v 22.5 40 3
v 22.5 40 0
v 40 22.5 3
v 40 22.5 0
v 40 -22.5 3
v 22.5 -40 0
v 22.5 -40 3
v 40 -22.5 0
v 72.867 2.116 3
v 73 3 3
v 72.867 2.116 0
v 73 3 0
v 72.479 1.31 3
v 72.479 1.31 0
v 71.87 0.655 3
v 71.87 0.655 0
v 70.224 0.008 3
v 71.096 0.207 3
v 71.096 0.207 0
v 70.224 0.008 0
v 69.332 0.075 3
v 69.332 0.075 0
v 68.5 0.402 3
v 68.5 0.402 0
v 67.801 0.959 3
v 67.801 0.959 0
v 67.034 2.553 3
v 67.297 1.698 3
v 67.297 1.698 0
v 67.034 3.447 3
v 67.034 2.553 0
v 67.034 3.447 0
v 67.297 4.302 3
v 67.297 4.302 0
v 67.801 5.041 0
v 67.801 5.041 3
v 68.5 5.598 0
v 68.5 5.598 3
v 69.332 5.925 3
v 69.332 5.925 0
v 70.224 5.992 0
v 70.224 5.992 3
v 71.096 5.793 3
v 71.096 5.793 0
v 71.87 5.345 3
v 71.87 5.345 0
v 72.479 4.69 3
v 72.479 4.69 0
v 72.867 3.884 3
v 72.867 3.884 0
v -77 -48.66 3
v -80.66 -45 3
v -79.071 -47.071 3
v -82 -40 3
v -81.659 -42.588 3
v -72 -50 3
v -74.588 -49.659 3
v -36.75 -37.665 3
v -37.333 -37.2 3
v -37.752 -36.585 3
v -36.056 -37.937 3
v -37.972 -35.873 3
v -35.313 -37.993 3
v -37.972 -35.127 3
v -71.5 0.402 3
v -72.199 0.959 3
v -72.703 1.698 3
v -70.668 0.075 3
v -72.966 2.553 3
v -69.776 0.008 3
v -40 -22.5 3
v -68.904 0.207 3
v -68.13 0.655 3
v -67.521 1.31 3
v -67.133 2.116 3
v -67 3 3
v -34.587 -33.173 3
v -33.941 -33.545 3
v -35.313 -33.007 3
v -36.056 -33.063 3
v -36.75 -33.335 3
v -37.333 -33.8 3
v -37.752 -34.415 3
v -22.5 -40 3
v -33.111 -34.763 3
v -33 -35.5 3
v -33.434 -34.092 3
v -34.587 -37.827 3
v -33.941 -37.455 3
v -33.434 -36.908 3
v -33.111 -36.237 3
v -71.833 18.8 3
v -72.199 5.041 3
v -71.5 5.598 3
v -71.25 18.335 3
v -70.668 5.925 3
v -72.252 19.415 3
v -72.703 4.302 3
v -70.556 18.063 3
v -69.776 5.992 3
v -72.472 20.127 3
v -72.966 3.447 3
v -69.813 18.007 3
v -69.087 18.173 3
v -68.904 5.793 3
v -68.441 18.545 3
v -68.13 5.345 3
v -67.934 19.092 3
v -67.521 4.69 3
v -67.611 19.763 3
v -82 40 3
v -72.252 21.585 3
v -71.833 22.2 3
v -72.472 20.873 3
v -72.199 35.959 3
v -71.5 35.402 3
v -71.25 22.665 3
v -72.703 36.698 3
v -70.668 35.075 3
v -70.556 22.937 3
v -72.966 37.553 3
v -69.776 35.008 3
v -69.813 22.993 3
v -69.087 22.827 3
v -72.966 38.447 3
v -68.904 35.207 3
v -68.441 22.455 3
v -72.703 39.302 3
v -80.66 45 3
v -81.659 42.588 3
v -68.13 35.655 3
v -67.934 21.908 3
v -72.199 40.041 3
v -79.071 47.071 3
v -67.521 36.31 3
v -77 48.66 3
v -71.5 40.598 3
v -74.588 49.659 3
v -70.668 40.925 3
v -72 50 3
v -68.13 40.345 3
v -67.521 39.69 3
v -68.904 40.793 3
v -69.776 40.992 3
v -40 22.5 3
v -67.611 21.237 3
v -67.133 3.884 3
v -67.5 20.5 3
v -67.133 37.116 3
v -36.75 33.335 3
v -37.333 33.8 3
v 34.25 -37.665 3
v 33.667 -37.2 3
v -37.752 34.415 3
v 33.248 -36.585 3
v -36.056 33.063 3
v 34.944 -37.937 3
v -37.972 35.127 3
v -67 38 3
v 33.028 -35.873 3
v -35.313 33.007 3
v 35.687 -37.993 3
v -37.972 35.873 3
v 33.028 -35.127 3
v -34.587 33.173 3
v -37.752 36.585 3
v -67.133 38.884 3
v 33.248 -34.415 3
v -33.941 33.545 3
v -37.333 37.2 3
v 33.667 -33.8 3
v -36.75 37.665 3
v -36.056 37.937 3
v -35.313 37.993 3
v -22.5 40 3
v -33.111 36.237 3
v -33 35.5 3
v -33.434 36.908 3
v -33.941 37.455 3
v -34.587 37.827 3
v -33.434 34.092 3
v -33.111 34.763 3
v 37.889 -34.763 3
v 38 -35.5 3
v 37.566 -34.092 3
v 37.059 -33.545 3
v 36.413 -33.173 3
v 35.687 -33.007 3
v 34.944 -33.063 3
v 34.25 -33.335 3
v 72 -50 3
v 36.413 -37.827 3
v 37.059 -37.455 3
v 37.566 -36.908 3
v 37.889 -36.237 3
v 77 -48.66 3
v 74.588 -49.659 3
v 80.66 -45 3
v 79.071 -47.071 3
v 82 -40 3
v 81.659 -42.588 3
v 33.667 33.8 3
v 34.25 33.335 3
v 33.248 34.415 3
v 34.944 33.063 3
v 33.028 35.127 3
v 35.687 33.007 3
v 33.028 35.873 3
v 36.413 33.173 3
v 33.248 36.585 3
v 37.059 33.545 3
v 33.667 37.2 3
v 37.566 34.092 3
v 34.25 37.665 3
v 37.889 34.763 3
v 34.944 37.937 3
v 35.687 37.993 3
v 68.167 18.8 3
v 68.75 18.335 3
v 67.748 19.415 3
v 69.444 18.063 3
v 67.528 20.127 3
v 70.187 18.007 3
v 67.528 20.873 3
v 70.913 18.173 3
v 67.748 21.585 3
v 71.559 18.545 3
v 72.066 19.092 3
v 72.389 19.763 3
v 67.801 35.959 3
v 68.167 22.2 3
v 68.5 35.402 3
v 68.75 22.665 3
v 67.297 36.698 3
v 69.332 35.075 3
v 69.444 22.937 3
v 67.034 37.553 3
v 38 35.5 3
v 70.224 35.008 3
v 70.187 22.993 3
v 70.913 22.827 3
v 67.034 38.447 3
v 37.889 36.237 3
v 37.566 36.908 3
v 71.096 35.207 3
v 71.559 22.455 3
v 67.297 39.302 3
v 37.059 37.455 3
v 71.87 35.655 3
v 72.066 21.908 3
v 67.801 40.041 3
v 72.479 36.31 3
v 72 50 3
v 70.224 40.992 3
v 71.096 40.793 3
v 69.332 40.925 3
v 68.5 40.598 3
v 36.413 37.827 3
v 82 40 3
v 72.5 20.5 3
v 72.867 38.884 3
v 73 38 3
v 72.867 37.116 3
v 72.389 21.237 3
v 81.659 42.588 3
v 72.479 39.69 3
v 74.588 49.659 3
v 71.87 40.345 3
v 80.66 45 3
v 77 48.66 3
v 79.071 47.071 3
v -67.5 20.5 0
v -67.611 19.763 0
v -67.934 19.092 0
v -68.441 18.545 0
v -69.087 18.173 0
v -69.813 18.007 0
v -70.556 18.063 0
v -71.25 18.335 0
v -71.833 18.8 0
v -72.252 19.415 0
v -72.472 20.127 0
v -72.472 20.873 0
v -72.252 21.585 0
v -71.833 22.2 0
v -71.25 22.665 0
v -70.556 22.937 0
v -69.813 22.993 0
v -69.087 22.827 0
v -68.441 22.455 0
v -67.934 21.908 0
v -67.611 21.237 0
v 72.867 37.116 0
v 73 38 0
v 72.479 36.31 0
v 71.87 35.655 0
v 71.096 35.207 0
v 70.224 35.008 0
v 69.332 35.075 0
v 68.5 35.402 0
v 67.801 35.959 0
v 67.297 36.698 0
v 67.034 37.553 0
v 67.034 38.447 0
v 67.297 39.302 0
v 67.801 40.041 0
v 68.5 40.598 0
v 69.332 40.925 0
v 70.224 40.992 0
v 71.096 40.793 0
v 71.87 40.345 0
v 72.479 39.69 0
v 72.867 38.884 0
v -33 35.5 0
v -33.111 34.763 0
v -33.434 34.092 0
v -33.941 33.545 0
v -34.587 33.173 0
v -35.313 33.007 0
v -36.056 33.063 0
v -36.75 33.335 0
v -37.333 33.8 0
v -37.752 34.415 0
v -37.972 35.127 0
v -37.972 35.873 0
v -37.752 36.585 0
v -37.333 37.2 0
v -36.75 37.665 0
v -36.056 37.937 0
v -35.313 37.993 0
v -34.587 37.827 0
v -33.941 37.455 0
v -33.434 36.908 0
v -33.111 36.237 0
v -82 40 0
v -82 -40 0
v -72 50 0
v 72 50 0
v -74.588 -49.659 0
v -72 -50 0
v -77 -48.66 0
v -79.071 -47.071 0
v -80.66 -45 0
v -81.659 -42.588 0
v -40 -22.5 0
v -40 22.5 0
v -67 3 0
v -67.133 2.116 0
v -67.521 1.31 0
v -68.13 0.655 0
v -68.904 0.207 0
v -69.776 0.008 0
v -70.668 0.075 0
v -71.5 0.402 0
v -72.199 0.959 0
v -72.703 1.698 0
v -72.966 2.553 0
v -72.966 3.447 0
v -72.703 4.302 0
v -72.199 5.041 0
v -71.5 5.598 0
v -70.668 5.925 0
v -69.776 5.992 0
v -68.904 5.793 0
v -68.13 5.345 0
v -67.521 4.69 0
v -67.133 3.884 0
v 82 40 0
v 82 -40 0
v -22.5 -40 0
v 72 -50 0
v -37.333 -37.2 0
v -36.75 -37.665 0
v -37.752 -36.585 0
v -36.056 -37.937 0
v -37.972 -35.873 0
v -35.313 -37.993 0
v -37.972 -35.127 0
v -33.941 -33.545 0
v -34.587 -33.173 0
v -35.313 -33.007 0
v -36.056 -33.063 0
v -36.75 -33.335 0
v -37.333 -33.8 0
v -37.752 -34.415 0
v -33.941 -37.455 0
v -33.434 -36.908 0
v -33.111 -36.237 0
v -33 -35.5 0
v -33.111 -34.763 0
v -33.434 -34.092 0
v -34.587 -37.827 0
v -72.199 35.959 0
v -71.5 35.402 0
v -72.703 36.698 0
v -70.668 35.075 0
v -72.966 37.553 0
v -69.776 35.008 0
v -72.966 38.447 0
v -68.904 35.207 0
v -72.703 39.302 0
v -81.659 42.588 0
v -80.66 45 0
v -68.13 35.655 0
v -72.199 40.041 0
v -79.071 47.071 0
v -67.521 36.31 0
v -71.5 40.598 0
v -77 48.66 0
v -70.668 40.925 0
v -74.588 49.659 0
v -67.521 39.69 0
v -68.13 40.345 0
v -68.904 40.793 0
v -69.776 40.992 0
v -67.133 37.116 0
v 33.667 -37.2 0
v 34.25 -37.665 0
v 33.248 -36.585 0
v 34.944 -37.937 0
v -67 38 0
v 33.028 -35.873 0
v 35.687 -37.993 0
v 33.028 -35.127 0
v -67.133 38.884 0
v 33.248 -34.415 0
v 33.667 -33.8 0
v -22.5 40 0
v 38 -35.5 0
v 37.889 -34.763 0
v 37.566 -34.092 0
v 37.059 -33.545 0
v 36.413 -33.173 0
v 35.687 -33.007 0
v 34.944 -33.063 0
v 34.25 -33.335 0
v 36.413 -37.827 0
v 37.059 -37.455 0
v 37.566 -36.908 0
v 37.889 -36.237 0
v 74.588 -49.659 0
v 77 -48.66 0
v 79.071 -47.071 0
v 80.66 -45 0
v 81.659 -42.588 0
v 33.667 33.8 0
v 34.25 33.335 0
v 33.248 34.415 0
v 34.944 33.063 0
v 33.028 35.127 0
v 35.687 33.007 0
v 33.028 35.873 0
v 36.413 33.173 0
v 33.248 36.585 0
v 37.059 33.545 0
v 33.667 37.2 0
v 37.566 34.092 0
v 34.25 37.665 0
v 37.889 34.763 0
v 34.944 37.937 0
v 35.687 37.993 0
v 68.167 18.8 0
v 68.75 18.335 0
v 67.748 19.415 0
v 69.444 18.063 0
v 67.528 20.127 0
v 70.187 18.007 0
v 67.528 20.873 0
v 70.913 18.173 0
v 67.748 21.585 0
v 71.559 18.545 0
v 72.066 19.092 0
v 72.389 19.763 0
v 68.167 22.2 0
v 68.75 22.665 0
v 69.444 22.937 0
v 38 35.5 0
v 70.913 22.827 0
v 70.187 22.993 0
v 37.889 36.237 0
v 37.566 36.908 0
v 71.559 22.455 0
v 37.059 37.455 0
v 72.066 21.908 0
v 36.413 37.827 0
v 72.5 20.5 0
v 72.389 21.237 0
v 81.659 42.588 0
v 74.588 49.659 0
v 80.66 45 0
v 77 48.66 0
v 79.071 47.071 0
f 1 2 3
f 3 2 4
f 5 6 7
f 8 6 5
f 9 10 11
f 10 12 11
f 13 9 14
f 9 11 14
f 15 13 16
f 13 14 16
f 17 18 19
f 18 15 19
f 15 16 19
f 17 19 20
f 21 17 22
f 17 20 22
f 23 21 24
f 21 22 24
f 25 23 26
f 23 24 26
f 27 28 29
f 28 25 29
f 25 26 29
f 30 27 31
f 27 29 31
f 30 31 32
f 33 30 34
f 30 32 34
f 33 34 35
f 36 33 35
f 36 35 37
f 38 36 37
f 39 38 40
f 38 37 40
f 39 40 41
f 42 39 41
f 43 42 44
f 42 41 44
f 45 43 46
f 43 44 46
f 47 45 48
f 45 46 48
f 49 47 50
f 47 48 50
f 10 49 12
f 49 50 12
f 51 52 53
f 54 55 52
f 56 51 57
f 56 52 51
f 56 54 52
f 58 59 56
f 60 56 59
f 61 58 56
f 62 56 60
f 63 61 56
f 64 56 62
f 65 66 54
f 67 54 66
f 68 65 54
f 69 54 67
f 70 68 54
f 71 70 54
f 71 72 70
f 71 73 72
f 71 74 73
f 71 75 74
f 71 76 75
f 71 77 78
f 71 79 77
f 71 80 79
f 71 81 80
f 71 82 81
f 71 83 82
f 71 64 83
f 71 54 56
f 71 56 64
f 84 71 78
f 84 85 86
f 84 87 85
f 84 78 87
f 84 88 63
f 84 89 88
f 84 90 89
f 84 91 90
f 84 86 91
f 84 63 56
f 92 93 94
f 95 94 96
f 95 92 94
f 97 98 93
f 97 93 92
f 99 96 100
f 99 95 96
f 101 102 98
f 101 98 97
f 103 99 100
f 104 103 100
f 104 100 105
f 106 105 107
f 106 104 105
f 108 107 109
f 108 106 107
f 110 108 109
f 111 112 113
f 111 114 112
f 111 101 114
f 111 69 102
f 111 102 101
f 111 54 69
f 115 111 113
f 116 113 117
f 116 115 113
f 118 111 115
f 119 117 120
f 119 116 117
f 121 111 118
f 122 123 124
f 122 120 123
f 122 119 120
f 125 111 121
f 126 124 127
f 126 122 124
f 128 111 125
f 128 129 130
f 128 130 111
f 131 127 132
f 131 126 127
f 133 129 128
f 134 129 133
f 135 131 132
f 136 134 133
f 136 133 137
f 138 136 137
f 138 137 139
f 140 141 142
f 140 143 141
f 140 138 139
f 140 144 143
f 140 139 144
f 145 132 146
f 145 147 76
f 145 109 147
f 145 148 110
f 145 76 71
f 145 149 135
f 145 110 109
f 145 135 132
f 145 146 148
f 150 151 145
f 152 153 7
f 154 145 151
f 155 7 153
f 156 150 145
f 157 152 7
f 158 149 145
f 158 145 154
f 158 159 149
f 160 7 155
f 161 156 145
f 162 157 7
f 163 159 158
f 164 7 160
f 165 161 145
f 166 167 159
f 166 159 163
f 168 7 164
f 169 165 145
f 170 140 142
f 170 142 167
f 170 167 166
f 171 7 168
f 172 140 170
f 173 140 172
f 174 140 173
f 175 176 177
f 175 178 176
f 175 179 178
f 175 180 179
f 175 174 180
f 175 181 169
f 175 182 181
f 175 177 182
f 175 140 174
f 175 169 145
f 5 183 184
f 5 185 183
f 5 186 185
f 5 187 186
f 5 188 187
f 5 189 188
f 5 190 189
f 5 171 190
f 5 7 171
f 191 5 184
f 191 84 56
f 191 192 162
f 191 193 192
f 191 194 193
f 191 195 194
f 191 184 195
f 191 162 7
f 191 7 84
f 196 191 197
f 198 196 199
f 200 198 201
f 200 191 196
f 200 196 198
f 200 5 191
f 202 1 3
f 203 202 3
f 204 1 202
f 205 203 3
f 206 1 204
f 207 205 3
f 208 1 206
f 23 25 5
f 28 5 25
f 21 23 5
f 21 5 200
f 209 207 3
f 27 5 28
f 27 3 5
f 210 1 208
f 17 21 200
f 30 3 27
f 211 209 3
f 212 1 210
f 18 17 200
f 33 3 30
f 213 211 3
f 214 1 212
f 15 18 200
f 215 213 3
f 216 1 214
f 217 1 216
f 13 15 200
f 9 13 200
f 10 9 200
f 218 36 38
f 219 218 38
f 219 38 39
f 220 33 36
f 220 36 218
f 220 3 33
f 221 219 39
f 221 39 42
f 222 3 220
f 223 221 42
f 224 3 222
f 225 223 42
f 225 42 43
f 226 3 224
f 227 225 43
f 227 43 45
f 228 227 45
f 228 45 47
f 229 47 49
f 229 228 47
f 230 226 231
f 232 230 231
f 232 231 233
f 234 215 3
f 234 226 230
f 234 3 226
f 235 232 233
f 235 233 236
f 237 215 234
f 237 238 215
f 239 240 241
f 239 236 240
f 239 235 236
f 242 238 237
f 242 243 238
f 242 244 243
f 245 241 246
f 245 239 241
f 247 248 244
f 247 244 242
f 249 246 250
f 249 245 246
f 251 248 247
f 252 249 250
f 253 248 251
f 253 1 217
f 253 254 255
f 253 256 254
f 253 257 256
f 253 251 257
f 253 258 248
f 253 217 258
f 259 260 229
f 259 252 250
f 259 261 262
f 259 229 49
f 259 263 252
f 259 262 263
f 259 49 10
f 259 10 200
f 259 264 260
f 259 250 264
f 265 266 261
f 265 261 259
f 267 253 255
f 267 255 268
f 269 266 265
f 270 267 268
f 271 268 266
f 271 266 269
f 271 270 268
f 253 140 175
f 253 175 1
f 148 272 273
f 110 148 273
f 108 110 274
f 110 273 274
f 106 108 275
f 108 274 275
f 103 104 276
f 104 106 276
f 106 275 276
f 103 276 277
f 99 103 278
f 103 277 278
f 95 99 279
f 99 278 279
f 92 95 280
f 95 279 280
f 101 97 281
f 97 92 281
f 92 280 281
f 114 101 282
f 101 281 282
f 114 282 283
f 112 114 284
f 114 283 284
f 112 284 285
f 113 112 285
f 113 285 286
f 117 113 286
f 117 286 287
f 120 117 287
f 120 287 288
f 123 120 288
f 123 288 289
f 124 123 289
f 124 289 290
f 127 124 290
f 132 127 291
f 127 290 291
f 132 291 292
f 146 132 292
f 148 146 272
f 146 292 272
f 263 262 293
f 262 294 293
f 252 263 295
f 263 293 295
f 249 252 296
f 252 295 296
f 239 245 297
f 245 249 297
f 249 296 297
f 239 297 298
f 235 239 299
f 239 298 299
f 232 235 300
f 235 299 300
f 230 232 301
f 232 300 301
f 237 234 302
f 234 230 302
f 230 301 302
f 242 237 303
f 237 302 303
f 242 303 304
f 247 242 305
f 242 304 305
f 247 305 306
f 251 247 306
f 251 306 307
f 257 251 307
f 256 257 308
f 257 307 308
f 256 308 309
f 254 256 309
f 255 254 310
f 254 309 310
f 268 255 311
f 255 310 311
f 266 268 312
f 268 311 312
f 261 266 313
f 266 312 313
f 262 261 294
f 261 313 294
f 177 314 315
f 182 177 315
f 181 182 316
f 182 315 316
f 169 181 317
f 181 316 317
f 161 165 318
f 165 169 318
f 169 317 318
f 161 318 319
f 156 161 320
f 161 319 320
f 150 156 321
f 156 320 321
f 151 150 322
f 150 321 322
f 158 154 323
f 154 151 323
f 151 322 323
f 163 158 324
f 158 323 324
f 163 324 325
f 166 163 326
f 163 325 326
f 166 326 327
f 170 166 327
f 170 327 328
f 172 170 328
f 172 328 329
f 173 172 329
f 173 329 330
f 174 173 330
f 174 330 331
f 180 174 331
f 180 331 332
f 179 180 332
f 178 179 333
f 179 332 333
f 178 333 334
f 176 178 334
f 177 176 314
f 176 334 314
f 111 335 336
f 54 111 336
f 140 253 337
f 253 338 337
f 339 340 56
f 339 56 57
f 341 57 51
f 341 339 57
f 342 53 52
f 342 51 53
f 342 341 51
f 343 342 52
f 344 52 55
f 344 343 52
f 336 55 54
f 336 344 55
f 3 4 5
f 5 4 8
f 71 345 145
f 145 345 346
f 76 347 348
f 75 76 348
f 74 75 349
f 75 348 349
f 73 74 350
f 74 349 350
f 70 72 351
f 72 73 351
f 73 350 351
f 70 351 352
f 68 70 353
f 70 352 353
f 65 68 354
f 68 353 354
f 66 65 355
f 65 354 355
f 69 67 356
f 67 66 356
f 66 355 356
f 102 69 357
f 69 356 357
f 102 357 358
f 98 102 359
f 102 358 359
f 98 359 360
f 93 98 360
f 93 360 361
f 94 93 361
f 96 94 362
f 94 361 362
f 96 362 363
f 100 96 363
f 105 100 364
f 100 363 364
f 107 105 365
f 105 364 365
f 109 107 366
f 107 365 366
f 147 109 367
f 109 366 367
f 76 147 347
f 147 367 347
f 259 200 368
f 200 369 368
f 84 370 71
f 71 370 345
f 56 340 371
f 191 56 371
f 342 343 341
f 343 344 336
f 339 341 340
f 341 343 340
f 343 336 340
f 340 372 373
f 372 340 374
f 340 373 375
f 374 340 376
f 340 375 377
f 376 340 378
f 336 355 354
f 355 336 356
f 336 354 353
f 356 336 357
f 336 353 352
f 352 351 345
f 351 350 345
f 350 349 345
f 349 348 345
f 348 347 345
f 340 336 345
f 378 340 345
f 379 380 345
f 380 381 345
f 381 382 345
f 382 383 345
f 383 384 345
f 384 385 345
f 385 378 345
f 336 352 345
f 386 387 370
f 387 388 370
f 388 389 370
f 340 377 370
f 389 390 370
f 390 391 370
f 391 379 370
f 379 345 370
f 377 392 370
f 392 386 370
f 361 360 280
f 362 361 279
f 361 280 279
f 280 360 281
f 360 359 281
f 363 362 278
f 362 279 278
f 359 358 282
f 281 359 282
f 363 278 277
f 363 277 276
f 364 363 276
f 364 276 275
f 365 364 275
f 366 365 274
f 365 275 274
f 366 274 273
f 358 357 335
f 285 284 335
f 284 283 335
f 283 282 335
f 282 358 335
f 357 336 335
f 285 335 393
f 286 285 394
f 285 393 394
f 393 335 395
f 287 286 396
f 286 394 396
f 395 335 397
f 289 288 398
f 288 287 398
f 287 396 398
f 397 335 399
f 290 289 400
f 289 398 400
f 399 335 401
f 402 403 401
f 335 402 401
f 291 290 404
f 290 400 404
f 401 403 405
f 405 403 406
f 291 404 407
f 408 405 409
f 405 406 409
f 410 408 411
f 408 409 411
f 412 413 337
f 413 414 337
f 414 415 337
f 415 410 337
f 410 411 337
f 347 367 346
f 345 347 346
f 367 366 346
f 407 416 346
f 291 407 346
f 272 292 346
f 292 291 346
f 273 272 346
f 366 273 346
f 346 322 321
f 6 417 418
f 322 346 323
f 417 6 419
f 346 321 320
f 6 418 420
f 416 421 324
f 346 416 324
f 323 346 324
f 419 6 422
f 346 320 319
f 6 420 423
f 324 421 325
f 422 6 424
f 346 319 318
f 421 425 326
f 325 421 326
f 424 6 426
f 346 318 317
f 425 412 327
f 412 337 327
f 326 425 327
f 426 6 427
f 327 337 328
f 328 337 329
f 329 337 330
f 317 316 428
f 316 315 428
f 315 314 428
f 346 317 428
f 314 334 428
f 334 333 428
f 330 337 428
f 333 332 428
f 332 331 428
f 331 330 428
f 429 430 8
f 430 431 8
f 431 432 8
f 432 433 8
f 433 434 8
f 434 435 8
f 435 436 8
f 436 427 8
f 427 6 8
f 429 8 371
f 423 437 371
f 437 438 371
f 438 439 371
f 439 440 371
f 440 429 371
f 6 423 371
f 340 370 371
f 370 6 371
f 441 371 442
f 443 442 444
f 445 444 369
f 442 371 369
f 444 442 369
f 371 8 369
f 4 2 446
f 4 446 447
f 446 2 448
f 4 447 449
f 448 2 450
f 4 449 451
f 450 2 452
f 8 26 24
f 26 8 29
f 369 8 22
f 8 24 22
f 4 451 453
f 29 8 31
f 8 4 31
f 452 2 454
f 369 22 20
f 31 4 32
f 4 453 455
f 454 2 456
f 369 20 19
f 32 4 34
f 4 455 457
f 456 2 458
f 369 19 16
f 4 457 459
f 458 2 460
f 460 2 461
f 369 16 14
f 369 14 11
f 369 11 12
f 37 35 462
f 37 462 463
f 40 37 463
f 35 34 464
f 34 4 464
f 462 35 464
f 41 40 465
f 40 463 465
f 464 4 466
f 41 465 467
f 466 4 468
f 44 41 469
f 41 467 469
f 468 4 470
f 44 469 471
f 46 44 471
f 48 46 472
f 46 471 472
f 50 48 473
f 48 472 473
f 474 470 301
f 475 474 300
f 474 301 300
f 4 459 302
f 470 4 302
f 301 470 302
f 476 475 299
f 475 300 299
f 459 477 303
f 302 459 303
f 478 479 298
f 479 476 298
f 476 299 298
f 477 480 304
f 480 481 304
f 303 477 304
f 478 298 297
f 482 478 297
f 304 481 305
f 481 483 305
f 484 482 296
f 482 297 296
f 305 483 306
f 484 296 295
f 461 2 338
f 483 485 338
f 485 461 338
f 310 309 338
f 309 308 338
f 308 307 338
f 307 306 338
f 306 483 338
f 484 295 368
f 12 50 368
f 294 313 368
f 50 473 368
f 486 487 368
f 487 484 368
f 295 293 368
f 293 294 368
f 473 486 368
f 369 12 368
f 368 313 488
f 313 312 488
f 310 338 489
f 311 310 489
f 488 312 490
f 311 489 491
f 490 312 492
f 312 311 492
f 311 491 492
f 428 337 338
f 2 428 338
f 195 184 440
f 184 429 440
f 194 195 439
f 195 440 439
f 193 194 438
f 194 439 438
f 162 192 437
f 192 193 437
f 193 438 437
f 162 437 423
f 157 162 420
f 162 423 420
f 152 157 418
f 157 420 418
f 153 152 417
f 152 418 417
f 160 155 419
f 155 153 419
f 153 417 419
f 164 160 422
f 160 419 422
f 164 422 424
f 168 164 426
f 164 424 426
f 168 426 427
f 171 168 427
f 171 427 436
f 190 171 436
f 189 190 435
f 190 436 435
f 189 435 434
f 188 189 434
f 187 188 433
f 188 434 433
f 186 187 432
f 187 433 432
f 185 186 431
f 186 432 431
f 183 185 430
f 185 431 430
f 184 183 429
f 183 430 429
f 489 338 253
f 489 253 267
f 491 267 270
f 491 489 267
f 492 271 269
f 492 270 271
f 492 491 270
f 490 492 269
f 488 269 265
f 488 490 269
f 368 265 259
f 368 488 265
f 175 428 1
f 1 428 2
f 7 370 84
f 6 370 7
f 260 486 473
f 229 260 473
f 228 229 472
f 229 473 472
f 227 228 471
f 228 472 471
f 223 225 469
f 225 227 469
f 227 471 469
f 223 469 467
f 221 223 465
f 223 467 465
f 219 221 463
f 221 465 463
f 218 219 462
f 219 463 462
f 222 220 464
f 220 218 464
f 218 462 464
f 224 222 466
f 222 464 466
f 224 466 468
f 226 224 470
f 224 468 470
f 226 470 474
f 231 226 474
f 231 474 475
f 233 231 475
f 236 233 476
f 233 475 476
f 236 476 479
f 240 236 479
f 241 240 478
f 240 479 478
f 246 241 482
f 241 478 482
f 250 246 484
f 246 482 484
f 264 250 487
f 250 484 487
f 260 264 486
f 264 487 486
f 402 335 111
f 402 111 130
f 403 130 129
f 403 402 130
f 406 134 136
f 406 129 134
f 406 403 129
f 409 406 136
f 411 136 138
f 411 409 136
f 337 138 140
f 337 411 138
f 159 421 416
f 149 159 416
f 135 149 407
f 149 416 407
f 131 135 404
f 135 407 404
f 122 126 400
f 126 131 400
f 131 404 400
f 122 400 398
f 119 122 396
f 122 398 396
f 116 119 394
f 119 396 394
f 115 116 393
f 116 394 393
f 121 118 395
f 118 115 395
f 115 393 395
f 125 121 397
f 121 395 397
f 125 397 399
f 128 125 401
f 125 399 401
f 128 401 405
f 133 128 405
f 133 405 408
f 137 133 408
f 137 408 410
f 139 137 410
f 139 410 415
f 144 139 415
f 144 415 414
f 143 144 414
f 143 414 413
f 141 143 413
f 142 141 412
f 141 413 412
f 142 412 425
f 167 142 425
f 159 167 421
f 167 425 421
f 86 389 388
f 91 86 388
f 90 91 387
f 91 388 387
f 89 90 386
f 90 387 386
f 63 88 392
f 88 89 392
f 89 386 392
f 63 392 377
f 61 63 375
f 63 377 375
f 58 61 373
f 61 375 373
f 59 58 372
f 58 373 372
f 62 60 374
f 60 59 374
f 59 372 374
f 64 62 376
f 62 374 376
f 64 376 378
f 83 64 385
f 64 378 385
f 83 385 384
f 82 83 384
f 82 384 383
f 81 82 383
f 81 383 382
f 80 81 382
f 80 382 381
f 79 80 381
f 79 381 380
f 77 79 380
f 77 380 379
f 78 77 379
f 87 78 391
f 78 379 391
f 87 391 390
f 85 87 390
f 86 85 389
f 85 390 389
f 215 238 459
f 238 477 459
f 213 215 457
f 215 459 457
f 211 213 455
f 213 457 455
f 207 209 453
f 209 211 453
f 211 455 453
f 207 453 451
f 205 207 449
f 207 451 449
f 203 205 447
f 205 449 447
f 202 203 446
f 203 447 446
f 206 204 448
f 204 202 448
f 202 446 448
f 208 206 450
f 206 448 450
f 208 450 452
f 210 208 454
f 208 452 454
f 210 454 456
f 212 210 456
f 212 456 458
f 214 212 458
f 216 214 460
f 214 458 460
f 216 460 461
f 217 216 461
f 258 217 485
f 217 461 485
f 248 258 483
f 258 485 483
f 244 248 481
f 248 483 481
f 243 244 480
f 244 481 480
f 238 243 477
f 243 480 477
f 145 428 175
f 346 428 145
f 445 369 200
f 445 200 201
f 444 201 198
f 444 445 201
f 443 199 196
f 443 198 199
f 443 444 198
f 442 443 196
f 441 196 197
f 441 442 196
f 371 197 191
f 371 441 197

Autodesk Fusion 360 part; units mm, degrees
sketch "Sketch1" plane through (0, 0, 0) normal (0, 0, 1) x (1, 0, 0)
  line L0 (35.5, 35.5) -> (-35.5, 35.5) construction
  line L1 (-35.5, 35.5) -> (-35.5, -35.5) construction
  line L2 (-35.5, -35.5) -> (35.5, -35.5) construction
  line L3 (35.5, -35.5) -> (35.5, 35.5) construction
  line L4 (35.5, 35.5) -> (-35.5, -35.5) construction
  line L5 (-35.5, 35.5) -> (35.5, -35.5) construction
  circle A0 centre (-35.5, 35.5) radius 2.5
  circle A1 centre (35.5, 35.5) radius 2.5
  circle A2 centre (-35.5, -35.5) radius 2.5
  circle A3 centre (35.5, -35.5) radius 2.5
  line L6 (63, 50) -> (-63, 50) construction
  line L7 (-63, 50) -> (-63, -50) construction
  line L8 (-63, -50) -> (63, -50) construction
  line L9 (63, -50) -> (63, 50) construction
  line L10 (63, 50) -> (-63, -50) construction
  line L11 (-63, 50) -> (63, -50) construction
  line L12 (40, 40) -> (-40, 40) construction
  line L13 (-40, 40) -> (-40, -40) construction
  line L14 (-40, -40) -> (40, -40) construction
  line L15 (40, -40) -> (40, 40) construction
  line L16 (40, 40) -> (-40, -40) construction
  line L17 (-40, 40) -> (40, -40) construction
  line L18 (-22.5, 40) -> (-40, 22.5)
  line L19 (0, 0) -> (0, 35.5) construction
  line L20 (0, 0) -> (35.5, 0) construction
  line L21 (22.5, 40) -> (40, 22.5)
  line L22 (-22.5, -40) -> (-40, -22.5)
  line L23 (22.5, -40) -> (40, -22.5)
  line L24 (-40, -22.5) -> (-40, 22.5)
  line L25 (-22.5, 40) -> (22.5, 40)
  line L26 (40, 22.5) -> (40, -22.5)
  line L27 (-22.5, -40) -> (22.5, -40)
  circle A4 centre (-70, 3) radius 3
  circle A5 centre (-70, 38) radius 3
  circle A6 centre (70, 38) radius 3
  circle A7 centre (70, 3) radius 3
  line L28 (-70, 38) -> (-70, 3) construction
  circle A8 centre (-70, 20.5) radius 2.5
  circle A9 centre (70, 20.5) radius 2.5
  line L29 (-72, -50) -> (72, -50)
  line L30 (82, -40) -> (82, 40)
  line L31 (72, 50) -> (-72, 50)
  line L32 (-82, 40) -> (-82, -40)
  arc A10 (-72, 50) -> (-82, 40) centre (-72, 40) ccw
  arc A11 (82, 40) -> (72, 50) centre (72, 40) ccw
  arc A12 (72, -50) -> (82, -40) centre (72, -40) ccw
  arc A13 (-82, -40) -> (-72, -50) centre (-72, -40) ccw
  point P0 (-70, 38)
  point P1 (-82, -50)
  point P2 (82, -50)
  point P3 (82, 50)
  dimension "d1" = 71
  dimension "d2" = 71
  dimension "d3" = 5
  dimension "d4" = 5
  dimension "d5" = 5
  dimension "d6" = 5
  dimension "d7" = 126
  dimension "d8" = 100
  dimension "d9" = 80
  dimension "d10" = 80
  dimension "d11" = 13
  dimension "d12" = 45
  dimension "d13" = 12
  dimension "d14" = 70
  dimension "d15" = 5
  dimension "d16" = 12
  dimension "d17" = 10
extrude "Extrude1" add sketch "Sketch1" along normal blind 3
